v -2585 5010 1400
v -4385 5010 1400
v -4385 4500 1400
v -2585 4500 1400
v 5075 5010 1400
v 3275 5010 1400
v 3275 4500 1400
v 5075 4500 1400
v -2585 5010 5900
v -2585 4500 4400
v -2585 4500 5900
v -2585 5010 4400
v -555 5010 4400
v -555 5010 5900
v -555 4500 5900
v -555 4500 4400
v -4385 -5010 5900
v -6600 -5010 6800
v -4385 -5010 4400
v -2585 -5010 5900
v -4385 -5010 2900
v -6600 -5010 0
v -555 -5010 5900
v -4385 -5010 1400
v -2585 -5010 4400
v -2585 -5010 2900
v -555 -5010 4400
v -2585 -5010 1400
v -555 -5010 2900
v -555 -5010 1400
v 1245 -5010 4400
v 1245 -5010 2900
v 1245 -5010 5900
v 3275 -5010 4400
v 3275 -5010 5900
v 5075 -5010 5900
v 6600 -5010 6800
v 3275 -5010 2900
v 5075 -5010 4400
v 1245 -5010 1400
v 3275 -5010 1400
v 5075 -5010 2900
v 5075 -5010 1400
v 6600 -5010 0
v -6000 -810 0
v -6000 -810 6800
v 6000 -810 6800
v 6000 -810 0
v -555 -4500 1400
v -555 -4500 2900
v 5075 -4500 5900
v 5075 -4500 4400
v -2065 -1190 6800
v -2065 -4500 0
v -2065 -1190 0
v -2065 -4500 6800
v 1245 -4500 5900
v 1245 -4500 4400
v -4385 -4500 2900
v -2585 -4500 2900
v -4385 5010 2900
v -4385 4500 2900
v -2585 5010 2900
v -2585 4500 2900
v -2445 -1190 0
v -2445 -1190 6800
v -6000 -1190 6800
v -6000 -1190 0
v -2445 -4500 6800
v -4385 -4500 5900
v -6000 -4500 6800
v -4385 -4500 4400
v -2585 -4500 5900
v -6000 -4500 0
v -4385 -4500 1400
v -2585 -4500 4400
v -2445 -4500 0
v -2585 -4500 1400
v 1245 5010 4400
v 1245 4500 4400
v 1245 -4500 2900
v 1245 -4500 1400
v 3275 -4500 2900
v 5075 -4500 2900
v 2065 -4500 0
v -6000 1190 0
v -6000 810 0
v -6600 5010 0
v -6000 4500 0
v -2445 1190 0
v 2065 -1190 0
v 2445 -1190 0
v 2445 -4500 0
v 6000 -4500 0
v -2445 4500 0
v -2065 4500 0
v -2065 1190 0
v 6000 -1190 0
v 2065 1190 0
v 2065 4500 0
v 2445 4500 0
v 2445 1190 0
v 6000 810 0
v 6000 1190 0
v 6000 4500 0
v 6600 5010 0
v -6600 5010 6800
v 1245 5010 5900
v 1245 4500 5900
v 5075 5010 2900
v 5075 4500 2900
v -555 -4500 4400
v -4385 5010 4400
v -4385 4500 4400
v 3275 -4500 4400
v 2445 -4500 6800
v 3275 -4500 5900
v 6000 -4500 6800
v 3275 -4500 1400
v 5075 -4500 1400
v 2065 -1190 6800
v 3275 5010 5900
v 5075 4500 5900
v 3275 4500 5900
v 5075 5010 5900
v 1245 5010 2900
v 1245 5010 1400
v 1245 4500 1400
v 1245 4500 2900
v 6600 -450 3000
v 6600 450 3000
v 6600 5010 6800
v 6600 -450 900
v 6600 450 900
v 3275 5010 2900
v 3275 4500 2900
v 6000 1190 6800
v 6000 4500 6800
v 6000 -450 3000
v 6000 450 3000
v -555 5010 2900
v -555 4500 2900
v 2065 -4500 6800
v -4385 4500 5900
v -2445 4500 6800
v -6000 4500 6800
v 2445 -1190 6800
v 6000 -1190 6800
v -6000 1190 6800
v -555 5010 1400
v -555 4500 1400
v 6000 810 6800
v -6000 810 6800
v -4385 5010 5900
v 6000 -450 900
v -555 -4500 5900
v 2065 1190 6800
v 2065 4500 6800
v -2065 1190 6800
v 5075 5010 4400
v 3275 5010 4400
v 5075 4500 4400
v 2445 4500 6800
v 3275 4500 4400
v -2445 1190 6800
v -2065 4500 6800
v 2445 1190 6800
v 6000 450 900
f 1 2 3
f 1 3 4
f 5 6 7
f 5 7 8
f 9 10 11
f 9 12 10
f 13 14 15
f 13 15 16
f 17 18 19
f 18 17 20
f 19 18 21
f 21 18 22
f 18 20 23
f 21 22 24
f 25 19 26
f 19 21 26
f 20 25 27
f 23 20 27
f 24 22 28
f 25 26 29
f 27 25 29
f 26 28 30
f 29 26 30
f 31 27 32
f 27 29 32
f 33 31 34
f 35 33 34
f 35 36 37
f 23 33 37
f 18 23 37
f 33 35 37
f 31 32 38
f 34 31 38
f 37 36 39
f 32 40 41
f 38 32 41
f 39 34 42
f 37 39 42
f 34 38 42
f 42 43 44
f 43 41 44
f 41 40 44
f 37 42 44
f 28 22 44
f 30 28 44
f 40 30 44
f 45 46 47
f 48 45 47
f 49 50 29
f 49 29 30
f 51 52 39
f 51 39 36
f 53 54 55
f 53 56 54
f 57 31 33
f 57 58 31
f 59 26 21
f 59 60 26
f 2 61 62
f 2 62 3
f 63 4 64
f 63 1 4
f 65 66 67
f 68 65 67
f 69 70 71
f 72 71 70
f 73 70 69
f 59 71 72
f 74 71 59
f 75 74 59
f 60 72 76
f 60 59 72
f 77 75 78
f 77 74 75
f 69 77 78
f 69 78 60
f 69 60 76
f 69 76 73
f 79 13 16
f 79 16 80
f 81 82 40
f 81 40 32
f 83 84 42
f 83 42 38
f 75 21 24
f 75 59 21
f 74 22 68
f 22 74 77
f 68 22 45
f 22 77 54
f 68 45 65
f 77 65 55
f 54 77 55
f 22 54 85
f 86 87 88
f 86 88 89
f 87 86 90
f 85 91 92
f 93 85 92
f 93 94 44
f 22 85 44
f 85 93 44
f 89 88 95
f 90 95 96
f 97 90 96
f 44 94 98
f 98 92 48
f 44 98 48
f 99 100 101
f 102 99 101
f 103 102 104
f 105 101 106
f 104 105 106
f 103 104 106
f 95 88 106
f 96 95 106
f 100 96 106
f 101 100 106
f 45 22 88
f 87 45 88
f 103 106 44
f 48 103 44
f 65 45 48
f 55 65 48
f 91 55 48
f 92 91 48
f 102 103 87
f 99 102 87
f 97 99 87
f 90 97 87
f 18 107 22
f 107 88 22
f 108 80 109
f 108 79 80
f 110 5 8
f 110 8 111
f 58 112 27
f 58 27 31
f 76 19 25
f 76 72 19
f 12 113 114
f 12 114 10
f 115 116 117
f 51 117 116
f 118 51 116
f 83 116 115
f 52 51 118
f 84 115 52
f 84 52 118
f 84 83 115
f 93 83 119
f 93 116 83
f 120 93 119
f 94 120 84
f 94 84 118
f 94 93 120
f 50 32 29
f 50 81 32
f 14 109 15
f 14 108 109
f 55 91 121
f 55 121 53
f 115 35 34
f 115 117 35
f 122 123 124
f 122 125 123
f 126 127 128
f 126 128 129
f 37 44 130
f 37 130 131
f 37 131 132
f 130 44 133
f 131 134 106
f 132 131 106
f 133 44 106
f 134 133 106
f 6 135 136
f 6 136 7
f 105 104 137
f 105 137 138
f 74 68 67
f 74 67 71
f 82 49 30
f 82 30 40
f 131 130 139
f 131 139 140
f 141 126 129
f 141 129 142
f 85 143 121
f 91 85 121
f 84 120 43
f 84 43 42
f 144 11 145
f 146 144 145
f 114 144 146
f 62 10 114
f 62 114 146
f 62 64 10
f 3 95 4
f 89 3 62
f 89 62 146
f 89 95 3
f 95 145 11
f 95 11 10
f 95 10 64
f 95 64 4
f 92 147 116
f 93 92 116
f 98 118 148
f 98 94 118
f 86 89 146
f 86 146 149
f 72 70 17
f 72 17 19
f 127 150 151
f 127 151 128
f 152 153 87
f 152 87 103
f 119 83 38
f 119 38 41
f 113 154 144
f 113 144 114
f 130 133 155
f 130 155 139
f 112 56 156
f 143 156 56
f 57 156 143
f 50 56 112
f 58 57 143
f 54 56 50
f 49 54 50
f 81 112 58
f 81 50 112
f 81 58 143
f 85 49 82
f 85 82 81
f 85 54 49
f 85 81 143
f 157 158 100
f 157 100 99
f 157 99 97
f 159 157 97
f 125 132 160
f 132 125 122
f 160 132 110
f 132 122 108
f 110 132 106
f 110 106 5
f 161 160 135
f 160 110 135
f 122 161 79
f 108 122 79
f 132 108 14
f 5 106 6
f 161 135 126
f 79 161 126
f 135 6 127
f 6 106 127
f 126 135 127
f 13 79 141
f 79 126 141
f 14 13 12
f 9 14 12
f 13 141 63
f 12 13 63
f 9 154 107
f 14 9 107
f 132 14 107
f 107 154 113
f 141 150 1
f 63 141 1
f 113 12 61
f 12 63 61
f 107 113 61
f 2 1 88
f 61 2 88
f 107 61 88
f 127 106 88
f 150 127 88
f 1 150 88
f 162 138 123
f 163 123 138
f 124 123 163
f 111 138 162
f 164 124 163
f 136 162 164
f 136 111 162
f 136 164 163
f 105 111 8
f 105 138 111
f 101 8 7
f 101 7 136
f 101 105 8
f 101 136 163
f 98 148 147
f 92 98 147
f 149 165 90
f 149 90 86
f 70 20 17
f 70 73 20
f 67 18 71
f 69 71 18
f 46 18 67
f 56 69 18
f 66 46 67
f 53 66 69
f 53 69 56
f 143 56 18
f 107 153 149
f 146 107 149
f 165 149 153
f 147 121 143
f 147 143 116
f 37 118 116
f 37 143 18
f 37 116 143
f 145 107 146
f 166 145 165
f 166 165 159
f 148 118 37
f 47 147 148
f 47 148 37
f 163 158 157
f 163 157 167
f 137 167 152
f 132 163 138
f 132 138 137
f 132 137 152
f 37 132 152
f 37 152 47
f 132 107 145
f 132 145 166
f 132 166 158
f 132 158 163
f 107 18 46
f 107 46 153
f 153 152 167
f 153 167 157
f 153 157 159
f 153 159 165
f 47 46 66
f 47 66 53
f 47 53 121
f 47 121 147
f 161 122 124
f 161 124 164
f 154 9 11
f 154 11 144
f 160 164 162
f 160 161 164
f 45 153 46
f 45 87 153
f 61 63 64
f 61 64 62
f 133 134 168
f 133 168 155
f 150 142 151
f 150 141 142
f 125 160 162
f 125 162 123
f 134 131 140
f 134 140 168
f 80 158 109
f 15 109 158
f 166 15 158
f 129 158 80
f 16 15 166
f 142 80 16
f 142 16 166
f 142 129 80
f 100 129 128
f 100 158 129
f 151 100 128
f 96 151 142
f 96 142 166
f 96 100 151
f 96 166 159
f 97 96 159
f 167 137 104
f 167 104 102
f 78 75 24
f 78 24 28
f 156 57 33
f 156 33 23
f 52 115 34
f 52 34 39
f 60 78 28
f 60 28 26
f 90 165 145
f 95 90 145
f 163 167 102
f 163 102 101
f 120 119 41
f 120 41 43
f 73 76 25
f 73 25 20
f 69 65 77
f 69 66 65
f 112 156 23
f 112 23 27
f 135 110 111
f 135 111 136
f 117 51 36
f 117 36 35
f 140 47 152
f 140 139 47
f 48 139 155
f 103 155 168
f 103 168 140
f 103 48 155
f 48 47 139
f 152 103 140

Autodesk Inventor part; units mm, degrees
ref_plane "YZ Plane" through (0, 0, 0) normal (1, 0, 0) x (0, 1, 0)
ref_plane "XZ Plane" through (0, 0, 0) normal (0, 1, 0) x (-1, 0, 0)
ref_plane "XY Plane" through (0, 0, 0) normal (0, 0, 1) x (1, 0, 0)
sketch "Sketch1" plane through (0, 0, 0) normal (0, 0, 1) x (1, 0, 0)
  line L0 (6000, 4500) -> (-6000, 4500)
  line L1 (-6000, 4500) -> (-6000, -4500)
  line L2 (-6000, -4500) -> (6000, -4500)
  line L3 (6000, -4500) -> (6000, 4500)
  line L4 (6000, 4500) -> (-6000, -4500) construction
  line L5 (-6000, 4500) -> (6000, -4500) construction
  line L6 (6600, 5010) -> (-6600, 5010)
  line L7 (-6600, 5010) -> (-6600, -5010)
  line L8 (-6600, -5010) -> (6600, -5010)
  line L9 (6600, -5010) -> (6600, 5010)
  line L10 (6600, 5010) -> (-6600, -5010) construction
  line L11 (-6600, 5010) -> (6600, -5010) construction
  point P0 (0, 0)
  dimension "d0" = 12000
  dimension "d1" = 9000
  dimension "d2" = 13200
  dimension "d3" = 10020
extrude "Extrusion1" add sketch "Sketch1" along normal blind 6800
sketch "Sketch2" plane through (-6600, 5010, 0) normal (0, 1, 0) x (1, 0, 0)
  line L0 (11675, -2900) -> (9875, -2900)
  line L1 (9875, -2900) -> (9875, -1400)
  line L2 (9875, -1400) -> (11675, -1400)
  line L3 (11675, -1400) -> (11675, -2900)
  line L4 (13200, 0) -> (13200, -6800) projected
  line L5 (13200, 0) -> (0, 0) projected
  line L6 (11675, -5900) -> (9875, -5900)
  line L7 (9875, -5900) -> (9875, -4400)
  line L8 (9875, -4400) -> (11675, -4400)
  line L9 (11675, -4400) -> (11675, -5900)
  line L10 (7845, -2900) -> (6045, -2900)
  line L11 (6045, -2900) -> (6045, -1400)
  line L12 (6045, -1400) -> (7845, -1400)
  line L13 (7845, -1400) -> (7845, -2900)
  line L14 (7845, -5900) -> (6045, -5900)
  line L15 (6045, -5900) -> (6045, -4400)
  line L16 (6045, -4400) -> (7845, -4400)
  line L17 (7845, -4400) -> (7845, -5900)
  line L18 (4015, -2900) -> (2215, -2900)
  line L19 (2215, -2900) -> (2215, -1400)
  line L20 (2215, -1400) -> (4015, -1400)
  line L21 (4015, -1400) -> (4015, -2900)
  line L22 (4015, -5900) -> (2215, -5900)
  line L23 (2215, -5900) -> (2215, -4400)
  line L24 (2215, -4400) -> (4015, -4400)
  line L25 (4015, -4400) -> (4015, -5900)
  point P0 (6600, 0)
  dimension "d6" = 1800
  dimension "d7" = 1500
  dimension "d8" = 1525
  dimension "d9" = 1400
  dimension "d10" = 1800
  dimension "d11" = 1500
  dimension "d12" = 1500
  dimension "d13" = 1525
  dimension "d14" = 1800
  dimension "d15" = 1500
  dimension "d16" = 1800
  dimension "d17" = 1500
  dimension "d18" = 1500
  dimension "d19" = 1800
  dimension "d20" = 1500
  dimension "d21" = 1800
  dimension "d22" = 1500
  dimension "d23" = 1500
  dimension "d24" = 2030
  dimension "d25" = 2030
extrude "Extrusion2" cut sketch "Sketch2" against normal blind 11000
sketch "Sketch3" plane through (0, 0, 6800) normal (0, 0, 1) x (1, 0, 0)
  line L0 (6000, 4500) -> (6000, -4500) projected
  line L1 (-6000, -4500) -> (-6000, 4500) projected
  line L2 (6000, 0) -> (7500, 0) construction
  line L3 (-6000, 810) -> (6000, 810)
  line L4 (6000, 810) -> (6000, 1190)
  line L5 (6000, 1190) -> (-6000, 1190)
  line L6 (-6000, 1190) -> (-6000, 810)
  line L7 (6000, 4500) -> (2445, 4500)
  line L8 (-6000, 4500) -> (6000, 4500) projected
  line L9 (2445, 4500) -> (2065, 4500)
  line L10 (2445, 1190) -> (2445, 4500)
  line L11 (2065, 4500) -> (2065, 1190)
  line L12 (-2065, 1190) -> (-2445, 1190)
  line L13 (-2445, 1190) -> (-2445, 4500)
  line L14 (-2445, 4500) -> (-2065, 4500)
  line L15 (-2065, 4500) -> (-2065, 1190)
  line L16 (6000, 0) -> (-6000, 0)
  line L17 (-6000, -810) -> (6000, -810)
  line L18 (6000, -810) -> (6000, -1190)
  line L19 (6000, -1190) -> (-6000, -1190)
  line L20 (-6000, -1190) -> (-6000, -810)
  line L21 (6000, -4500) -> (2445, -4500)
  line L22 (2445, -4500) -> (2065, -4500)
  line L23 (2445, -1190) -> (2445, -4500)
  line L24 (2065, -4500) -> (2065, -1190)
  line L25 (-2065, -1190) -> (-2445, -1190)
  line L26 (-2445, -1190) -> (-2445, -4500)
  line L27 (-2445, -4500) -> (-2065, -4500)
  line L28 (-2065, -4500) -> (-2065, -1190)
  point P0 (6000, 1500)
  point P1 (-2445, 4500)
  point P2 (-6000, 1190)
  point P3 (-6000, 810)
  point P4 (6000, 810)
  point P5 (6000, 1190)
  point P6 (2445, 4500)
  point P7 (2065, 4500)
  point P8 (6000, -1500)
  point P9 (-2445, -4500)
  point P10 (2065, -1190)
  point P11 (2065, 1190)
  dimension "d39" = 3310
  dimension "d46" = 3555
  dimension "d47" = 380
  dimension "d50" = 380
  dimension "d52" = 3555
  dimension "d53" = 0
  dimension "d54" = 0
extrude "Extrusion4" add sketch "Sketch3" against normal blind 6800 contours L0 L3 L1 L5 | L10 L5 L11 L8 | L15 L5 L13 L8 | L0 L19 L1 L17 | L23 L22 L24 L19 | L19 L28 L27 L26
sketch "Sketch4" plane through (6600, -5010, 0) normal (1, 0, 0) x (0, 0, -1)
  line L0 (-900, 5010) -> (-900, 4560)
  line L1 (-900, 4560) -> (-3000, 4560)
  line L2 (-3000, 4560) -> (-3000, 5460)
  line L3 (-3000, 5460) -> (-900, 5460)
  line L4 (-900, 5460) -> (-900, 4560)
  line L5 (0, 0) -> (0, 10020) projected
  point P0 (0, 10020)
  dimension "d62" = 450
  dimension "d63" = 2100
  dimension "d64" = 900
  dimension "d65" = 3000
extrude "Extrusion5" cut sketch "Sketch4" against normal blind 680
properties part number "home_templae"
